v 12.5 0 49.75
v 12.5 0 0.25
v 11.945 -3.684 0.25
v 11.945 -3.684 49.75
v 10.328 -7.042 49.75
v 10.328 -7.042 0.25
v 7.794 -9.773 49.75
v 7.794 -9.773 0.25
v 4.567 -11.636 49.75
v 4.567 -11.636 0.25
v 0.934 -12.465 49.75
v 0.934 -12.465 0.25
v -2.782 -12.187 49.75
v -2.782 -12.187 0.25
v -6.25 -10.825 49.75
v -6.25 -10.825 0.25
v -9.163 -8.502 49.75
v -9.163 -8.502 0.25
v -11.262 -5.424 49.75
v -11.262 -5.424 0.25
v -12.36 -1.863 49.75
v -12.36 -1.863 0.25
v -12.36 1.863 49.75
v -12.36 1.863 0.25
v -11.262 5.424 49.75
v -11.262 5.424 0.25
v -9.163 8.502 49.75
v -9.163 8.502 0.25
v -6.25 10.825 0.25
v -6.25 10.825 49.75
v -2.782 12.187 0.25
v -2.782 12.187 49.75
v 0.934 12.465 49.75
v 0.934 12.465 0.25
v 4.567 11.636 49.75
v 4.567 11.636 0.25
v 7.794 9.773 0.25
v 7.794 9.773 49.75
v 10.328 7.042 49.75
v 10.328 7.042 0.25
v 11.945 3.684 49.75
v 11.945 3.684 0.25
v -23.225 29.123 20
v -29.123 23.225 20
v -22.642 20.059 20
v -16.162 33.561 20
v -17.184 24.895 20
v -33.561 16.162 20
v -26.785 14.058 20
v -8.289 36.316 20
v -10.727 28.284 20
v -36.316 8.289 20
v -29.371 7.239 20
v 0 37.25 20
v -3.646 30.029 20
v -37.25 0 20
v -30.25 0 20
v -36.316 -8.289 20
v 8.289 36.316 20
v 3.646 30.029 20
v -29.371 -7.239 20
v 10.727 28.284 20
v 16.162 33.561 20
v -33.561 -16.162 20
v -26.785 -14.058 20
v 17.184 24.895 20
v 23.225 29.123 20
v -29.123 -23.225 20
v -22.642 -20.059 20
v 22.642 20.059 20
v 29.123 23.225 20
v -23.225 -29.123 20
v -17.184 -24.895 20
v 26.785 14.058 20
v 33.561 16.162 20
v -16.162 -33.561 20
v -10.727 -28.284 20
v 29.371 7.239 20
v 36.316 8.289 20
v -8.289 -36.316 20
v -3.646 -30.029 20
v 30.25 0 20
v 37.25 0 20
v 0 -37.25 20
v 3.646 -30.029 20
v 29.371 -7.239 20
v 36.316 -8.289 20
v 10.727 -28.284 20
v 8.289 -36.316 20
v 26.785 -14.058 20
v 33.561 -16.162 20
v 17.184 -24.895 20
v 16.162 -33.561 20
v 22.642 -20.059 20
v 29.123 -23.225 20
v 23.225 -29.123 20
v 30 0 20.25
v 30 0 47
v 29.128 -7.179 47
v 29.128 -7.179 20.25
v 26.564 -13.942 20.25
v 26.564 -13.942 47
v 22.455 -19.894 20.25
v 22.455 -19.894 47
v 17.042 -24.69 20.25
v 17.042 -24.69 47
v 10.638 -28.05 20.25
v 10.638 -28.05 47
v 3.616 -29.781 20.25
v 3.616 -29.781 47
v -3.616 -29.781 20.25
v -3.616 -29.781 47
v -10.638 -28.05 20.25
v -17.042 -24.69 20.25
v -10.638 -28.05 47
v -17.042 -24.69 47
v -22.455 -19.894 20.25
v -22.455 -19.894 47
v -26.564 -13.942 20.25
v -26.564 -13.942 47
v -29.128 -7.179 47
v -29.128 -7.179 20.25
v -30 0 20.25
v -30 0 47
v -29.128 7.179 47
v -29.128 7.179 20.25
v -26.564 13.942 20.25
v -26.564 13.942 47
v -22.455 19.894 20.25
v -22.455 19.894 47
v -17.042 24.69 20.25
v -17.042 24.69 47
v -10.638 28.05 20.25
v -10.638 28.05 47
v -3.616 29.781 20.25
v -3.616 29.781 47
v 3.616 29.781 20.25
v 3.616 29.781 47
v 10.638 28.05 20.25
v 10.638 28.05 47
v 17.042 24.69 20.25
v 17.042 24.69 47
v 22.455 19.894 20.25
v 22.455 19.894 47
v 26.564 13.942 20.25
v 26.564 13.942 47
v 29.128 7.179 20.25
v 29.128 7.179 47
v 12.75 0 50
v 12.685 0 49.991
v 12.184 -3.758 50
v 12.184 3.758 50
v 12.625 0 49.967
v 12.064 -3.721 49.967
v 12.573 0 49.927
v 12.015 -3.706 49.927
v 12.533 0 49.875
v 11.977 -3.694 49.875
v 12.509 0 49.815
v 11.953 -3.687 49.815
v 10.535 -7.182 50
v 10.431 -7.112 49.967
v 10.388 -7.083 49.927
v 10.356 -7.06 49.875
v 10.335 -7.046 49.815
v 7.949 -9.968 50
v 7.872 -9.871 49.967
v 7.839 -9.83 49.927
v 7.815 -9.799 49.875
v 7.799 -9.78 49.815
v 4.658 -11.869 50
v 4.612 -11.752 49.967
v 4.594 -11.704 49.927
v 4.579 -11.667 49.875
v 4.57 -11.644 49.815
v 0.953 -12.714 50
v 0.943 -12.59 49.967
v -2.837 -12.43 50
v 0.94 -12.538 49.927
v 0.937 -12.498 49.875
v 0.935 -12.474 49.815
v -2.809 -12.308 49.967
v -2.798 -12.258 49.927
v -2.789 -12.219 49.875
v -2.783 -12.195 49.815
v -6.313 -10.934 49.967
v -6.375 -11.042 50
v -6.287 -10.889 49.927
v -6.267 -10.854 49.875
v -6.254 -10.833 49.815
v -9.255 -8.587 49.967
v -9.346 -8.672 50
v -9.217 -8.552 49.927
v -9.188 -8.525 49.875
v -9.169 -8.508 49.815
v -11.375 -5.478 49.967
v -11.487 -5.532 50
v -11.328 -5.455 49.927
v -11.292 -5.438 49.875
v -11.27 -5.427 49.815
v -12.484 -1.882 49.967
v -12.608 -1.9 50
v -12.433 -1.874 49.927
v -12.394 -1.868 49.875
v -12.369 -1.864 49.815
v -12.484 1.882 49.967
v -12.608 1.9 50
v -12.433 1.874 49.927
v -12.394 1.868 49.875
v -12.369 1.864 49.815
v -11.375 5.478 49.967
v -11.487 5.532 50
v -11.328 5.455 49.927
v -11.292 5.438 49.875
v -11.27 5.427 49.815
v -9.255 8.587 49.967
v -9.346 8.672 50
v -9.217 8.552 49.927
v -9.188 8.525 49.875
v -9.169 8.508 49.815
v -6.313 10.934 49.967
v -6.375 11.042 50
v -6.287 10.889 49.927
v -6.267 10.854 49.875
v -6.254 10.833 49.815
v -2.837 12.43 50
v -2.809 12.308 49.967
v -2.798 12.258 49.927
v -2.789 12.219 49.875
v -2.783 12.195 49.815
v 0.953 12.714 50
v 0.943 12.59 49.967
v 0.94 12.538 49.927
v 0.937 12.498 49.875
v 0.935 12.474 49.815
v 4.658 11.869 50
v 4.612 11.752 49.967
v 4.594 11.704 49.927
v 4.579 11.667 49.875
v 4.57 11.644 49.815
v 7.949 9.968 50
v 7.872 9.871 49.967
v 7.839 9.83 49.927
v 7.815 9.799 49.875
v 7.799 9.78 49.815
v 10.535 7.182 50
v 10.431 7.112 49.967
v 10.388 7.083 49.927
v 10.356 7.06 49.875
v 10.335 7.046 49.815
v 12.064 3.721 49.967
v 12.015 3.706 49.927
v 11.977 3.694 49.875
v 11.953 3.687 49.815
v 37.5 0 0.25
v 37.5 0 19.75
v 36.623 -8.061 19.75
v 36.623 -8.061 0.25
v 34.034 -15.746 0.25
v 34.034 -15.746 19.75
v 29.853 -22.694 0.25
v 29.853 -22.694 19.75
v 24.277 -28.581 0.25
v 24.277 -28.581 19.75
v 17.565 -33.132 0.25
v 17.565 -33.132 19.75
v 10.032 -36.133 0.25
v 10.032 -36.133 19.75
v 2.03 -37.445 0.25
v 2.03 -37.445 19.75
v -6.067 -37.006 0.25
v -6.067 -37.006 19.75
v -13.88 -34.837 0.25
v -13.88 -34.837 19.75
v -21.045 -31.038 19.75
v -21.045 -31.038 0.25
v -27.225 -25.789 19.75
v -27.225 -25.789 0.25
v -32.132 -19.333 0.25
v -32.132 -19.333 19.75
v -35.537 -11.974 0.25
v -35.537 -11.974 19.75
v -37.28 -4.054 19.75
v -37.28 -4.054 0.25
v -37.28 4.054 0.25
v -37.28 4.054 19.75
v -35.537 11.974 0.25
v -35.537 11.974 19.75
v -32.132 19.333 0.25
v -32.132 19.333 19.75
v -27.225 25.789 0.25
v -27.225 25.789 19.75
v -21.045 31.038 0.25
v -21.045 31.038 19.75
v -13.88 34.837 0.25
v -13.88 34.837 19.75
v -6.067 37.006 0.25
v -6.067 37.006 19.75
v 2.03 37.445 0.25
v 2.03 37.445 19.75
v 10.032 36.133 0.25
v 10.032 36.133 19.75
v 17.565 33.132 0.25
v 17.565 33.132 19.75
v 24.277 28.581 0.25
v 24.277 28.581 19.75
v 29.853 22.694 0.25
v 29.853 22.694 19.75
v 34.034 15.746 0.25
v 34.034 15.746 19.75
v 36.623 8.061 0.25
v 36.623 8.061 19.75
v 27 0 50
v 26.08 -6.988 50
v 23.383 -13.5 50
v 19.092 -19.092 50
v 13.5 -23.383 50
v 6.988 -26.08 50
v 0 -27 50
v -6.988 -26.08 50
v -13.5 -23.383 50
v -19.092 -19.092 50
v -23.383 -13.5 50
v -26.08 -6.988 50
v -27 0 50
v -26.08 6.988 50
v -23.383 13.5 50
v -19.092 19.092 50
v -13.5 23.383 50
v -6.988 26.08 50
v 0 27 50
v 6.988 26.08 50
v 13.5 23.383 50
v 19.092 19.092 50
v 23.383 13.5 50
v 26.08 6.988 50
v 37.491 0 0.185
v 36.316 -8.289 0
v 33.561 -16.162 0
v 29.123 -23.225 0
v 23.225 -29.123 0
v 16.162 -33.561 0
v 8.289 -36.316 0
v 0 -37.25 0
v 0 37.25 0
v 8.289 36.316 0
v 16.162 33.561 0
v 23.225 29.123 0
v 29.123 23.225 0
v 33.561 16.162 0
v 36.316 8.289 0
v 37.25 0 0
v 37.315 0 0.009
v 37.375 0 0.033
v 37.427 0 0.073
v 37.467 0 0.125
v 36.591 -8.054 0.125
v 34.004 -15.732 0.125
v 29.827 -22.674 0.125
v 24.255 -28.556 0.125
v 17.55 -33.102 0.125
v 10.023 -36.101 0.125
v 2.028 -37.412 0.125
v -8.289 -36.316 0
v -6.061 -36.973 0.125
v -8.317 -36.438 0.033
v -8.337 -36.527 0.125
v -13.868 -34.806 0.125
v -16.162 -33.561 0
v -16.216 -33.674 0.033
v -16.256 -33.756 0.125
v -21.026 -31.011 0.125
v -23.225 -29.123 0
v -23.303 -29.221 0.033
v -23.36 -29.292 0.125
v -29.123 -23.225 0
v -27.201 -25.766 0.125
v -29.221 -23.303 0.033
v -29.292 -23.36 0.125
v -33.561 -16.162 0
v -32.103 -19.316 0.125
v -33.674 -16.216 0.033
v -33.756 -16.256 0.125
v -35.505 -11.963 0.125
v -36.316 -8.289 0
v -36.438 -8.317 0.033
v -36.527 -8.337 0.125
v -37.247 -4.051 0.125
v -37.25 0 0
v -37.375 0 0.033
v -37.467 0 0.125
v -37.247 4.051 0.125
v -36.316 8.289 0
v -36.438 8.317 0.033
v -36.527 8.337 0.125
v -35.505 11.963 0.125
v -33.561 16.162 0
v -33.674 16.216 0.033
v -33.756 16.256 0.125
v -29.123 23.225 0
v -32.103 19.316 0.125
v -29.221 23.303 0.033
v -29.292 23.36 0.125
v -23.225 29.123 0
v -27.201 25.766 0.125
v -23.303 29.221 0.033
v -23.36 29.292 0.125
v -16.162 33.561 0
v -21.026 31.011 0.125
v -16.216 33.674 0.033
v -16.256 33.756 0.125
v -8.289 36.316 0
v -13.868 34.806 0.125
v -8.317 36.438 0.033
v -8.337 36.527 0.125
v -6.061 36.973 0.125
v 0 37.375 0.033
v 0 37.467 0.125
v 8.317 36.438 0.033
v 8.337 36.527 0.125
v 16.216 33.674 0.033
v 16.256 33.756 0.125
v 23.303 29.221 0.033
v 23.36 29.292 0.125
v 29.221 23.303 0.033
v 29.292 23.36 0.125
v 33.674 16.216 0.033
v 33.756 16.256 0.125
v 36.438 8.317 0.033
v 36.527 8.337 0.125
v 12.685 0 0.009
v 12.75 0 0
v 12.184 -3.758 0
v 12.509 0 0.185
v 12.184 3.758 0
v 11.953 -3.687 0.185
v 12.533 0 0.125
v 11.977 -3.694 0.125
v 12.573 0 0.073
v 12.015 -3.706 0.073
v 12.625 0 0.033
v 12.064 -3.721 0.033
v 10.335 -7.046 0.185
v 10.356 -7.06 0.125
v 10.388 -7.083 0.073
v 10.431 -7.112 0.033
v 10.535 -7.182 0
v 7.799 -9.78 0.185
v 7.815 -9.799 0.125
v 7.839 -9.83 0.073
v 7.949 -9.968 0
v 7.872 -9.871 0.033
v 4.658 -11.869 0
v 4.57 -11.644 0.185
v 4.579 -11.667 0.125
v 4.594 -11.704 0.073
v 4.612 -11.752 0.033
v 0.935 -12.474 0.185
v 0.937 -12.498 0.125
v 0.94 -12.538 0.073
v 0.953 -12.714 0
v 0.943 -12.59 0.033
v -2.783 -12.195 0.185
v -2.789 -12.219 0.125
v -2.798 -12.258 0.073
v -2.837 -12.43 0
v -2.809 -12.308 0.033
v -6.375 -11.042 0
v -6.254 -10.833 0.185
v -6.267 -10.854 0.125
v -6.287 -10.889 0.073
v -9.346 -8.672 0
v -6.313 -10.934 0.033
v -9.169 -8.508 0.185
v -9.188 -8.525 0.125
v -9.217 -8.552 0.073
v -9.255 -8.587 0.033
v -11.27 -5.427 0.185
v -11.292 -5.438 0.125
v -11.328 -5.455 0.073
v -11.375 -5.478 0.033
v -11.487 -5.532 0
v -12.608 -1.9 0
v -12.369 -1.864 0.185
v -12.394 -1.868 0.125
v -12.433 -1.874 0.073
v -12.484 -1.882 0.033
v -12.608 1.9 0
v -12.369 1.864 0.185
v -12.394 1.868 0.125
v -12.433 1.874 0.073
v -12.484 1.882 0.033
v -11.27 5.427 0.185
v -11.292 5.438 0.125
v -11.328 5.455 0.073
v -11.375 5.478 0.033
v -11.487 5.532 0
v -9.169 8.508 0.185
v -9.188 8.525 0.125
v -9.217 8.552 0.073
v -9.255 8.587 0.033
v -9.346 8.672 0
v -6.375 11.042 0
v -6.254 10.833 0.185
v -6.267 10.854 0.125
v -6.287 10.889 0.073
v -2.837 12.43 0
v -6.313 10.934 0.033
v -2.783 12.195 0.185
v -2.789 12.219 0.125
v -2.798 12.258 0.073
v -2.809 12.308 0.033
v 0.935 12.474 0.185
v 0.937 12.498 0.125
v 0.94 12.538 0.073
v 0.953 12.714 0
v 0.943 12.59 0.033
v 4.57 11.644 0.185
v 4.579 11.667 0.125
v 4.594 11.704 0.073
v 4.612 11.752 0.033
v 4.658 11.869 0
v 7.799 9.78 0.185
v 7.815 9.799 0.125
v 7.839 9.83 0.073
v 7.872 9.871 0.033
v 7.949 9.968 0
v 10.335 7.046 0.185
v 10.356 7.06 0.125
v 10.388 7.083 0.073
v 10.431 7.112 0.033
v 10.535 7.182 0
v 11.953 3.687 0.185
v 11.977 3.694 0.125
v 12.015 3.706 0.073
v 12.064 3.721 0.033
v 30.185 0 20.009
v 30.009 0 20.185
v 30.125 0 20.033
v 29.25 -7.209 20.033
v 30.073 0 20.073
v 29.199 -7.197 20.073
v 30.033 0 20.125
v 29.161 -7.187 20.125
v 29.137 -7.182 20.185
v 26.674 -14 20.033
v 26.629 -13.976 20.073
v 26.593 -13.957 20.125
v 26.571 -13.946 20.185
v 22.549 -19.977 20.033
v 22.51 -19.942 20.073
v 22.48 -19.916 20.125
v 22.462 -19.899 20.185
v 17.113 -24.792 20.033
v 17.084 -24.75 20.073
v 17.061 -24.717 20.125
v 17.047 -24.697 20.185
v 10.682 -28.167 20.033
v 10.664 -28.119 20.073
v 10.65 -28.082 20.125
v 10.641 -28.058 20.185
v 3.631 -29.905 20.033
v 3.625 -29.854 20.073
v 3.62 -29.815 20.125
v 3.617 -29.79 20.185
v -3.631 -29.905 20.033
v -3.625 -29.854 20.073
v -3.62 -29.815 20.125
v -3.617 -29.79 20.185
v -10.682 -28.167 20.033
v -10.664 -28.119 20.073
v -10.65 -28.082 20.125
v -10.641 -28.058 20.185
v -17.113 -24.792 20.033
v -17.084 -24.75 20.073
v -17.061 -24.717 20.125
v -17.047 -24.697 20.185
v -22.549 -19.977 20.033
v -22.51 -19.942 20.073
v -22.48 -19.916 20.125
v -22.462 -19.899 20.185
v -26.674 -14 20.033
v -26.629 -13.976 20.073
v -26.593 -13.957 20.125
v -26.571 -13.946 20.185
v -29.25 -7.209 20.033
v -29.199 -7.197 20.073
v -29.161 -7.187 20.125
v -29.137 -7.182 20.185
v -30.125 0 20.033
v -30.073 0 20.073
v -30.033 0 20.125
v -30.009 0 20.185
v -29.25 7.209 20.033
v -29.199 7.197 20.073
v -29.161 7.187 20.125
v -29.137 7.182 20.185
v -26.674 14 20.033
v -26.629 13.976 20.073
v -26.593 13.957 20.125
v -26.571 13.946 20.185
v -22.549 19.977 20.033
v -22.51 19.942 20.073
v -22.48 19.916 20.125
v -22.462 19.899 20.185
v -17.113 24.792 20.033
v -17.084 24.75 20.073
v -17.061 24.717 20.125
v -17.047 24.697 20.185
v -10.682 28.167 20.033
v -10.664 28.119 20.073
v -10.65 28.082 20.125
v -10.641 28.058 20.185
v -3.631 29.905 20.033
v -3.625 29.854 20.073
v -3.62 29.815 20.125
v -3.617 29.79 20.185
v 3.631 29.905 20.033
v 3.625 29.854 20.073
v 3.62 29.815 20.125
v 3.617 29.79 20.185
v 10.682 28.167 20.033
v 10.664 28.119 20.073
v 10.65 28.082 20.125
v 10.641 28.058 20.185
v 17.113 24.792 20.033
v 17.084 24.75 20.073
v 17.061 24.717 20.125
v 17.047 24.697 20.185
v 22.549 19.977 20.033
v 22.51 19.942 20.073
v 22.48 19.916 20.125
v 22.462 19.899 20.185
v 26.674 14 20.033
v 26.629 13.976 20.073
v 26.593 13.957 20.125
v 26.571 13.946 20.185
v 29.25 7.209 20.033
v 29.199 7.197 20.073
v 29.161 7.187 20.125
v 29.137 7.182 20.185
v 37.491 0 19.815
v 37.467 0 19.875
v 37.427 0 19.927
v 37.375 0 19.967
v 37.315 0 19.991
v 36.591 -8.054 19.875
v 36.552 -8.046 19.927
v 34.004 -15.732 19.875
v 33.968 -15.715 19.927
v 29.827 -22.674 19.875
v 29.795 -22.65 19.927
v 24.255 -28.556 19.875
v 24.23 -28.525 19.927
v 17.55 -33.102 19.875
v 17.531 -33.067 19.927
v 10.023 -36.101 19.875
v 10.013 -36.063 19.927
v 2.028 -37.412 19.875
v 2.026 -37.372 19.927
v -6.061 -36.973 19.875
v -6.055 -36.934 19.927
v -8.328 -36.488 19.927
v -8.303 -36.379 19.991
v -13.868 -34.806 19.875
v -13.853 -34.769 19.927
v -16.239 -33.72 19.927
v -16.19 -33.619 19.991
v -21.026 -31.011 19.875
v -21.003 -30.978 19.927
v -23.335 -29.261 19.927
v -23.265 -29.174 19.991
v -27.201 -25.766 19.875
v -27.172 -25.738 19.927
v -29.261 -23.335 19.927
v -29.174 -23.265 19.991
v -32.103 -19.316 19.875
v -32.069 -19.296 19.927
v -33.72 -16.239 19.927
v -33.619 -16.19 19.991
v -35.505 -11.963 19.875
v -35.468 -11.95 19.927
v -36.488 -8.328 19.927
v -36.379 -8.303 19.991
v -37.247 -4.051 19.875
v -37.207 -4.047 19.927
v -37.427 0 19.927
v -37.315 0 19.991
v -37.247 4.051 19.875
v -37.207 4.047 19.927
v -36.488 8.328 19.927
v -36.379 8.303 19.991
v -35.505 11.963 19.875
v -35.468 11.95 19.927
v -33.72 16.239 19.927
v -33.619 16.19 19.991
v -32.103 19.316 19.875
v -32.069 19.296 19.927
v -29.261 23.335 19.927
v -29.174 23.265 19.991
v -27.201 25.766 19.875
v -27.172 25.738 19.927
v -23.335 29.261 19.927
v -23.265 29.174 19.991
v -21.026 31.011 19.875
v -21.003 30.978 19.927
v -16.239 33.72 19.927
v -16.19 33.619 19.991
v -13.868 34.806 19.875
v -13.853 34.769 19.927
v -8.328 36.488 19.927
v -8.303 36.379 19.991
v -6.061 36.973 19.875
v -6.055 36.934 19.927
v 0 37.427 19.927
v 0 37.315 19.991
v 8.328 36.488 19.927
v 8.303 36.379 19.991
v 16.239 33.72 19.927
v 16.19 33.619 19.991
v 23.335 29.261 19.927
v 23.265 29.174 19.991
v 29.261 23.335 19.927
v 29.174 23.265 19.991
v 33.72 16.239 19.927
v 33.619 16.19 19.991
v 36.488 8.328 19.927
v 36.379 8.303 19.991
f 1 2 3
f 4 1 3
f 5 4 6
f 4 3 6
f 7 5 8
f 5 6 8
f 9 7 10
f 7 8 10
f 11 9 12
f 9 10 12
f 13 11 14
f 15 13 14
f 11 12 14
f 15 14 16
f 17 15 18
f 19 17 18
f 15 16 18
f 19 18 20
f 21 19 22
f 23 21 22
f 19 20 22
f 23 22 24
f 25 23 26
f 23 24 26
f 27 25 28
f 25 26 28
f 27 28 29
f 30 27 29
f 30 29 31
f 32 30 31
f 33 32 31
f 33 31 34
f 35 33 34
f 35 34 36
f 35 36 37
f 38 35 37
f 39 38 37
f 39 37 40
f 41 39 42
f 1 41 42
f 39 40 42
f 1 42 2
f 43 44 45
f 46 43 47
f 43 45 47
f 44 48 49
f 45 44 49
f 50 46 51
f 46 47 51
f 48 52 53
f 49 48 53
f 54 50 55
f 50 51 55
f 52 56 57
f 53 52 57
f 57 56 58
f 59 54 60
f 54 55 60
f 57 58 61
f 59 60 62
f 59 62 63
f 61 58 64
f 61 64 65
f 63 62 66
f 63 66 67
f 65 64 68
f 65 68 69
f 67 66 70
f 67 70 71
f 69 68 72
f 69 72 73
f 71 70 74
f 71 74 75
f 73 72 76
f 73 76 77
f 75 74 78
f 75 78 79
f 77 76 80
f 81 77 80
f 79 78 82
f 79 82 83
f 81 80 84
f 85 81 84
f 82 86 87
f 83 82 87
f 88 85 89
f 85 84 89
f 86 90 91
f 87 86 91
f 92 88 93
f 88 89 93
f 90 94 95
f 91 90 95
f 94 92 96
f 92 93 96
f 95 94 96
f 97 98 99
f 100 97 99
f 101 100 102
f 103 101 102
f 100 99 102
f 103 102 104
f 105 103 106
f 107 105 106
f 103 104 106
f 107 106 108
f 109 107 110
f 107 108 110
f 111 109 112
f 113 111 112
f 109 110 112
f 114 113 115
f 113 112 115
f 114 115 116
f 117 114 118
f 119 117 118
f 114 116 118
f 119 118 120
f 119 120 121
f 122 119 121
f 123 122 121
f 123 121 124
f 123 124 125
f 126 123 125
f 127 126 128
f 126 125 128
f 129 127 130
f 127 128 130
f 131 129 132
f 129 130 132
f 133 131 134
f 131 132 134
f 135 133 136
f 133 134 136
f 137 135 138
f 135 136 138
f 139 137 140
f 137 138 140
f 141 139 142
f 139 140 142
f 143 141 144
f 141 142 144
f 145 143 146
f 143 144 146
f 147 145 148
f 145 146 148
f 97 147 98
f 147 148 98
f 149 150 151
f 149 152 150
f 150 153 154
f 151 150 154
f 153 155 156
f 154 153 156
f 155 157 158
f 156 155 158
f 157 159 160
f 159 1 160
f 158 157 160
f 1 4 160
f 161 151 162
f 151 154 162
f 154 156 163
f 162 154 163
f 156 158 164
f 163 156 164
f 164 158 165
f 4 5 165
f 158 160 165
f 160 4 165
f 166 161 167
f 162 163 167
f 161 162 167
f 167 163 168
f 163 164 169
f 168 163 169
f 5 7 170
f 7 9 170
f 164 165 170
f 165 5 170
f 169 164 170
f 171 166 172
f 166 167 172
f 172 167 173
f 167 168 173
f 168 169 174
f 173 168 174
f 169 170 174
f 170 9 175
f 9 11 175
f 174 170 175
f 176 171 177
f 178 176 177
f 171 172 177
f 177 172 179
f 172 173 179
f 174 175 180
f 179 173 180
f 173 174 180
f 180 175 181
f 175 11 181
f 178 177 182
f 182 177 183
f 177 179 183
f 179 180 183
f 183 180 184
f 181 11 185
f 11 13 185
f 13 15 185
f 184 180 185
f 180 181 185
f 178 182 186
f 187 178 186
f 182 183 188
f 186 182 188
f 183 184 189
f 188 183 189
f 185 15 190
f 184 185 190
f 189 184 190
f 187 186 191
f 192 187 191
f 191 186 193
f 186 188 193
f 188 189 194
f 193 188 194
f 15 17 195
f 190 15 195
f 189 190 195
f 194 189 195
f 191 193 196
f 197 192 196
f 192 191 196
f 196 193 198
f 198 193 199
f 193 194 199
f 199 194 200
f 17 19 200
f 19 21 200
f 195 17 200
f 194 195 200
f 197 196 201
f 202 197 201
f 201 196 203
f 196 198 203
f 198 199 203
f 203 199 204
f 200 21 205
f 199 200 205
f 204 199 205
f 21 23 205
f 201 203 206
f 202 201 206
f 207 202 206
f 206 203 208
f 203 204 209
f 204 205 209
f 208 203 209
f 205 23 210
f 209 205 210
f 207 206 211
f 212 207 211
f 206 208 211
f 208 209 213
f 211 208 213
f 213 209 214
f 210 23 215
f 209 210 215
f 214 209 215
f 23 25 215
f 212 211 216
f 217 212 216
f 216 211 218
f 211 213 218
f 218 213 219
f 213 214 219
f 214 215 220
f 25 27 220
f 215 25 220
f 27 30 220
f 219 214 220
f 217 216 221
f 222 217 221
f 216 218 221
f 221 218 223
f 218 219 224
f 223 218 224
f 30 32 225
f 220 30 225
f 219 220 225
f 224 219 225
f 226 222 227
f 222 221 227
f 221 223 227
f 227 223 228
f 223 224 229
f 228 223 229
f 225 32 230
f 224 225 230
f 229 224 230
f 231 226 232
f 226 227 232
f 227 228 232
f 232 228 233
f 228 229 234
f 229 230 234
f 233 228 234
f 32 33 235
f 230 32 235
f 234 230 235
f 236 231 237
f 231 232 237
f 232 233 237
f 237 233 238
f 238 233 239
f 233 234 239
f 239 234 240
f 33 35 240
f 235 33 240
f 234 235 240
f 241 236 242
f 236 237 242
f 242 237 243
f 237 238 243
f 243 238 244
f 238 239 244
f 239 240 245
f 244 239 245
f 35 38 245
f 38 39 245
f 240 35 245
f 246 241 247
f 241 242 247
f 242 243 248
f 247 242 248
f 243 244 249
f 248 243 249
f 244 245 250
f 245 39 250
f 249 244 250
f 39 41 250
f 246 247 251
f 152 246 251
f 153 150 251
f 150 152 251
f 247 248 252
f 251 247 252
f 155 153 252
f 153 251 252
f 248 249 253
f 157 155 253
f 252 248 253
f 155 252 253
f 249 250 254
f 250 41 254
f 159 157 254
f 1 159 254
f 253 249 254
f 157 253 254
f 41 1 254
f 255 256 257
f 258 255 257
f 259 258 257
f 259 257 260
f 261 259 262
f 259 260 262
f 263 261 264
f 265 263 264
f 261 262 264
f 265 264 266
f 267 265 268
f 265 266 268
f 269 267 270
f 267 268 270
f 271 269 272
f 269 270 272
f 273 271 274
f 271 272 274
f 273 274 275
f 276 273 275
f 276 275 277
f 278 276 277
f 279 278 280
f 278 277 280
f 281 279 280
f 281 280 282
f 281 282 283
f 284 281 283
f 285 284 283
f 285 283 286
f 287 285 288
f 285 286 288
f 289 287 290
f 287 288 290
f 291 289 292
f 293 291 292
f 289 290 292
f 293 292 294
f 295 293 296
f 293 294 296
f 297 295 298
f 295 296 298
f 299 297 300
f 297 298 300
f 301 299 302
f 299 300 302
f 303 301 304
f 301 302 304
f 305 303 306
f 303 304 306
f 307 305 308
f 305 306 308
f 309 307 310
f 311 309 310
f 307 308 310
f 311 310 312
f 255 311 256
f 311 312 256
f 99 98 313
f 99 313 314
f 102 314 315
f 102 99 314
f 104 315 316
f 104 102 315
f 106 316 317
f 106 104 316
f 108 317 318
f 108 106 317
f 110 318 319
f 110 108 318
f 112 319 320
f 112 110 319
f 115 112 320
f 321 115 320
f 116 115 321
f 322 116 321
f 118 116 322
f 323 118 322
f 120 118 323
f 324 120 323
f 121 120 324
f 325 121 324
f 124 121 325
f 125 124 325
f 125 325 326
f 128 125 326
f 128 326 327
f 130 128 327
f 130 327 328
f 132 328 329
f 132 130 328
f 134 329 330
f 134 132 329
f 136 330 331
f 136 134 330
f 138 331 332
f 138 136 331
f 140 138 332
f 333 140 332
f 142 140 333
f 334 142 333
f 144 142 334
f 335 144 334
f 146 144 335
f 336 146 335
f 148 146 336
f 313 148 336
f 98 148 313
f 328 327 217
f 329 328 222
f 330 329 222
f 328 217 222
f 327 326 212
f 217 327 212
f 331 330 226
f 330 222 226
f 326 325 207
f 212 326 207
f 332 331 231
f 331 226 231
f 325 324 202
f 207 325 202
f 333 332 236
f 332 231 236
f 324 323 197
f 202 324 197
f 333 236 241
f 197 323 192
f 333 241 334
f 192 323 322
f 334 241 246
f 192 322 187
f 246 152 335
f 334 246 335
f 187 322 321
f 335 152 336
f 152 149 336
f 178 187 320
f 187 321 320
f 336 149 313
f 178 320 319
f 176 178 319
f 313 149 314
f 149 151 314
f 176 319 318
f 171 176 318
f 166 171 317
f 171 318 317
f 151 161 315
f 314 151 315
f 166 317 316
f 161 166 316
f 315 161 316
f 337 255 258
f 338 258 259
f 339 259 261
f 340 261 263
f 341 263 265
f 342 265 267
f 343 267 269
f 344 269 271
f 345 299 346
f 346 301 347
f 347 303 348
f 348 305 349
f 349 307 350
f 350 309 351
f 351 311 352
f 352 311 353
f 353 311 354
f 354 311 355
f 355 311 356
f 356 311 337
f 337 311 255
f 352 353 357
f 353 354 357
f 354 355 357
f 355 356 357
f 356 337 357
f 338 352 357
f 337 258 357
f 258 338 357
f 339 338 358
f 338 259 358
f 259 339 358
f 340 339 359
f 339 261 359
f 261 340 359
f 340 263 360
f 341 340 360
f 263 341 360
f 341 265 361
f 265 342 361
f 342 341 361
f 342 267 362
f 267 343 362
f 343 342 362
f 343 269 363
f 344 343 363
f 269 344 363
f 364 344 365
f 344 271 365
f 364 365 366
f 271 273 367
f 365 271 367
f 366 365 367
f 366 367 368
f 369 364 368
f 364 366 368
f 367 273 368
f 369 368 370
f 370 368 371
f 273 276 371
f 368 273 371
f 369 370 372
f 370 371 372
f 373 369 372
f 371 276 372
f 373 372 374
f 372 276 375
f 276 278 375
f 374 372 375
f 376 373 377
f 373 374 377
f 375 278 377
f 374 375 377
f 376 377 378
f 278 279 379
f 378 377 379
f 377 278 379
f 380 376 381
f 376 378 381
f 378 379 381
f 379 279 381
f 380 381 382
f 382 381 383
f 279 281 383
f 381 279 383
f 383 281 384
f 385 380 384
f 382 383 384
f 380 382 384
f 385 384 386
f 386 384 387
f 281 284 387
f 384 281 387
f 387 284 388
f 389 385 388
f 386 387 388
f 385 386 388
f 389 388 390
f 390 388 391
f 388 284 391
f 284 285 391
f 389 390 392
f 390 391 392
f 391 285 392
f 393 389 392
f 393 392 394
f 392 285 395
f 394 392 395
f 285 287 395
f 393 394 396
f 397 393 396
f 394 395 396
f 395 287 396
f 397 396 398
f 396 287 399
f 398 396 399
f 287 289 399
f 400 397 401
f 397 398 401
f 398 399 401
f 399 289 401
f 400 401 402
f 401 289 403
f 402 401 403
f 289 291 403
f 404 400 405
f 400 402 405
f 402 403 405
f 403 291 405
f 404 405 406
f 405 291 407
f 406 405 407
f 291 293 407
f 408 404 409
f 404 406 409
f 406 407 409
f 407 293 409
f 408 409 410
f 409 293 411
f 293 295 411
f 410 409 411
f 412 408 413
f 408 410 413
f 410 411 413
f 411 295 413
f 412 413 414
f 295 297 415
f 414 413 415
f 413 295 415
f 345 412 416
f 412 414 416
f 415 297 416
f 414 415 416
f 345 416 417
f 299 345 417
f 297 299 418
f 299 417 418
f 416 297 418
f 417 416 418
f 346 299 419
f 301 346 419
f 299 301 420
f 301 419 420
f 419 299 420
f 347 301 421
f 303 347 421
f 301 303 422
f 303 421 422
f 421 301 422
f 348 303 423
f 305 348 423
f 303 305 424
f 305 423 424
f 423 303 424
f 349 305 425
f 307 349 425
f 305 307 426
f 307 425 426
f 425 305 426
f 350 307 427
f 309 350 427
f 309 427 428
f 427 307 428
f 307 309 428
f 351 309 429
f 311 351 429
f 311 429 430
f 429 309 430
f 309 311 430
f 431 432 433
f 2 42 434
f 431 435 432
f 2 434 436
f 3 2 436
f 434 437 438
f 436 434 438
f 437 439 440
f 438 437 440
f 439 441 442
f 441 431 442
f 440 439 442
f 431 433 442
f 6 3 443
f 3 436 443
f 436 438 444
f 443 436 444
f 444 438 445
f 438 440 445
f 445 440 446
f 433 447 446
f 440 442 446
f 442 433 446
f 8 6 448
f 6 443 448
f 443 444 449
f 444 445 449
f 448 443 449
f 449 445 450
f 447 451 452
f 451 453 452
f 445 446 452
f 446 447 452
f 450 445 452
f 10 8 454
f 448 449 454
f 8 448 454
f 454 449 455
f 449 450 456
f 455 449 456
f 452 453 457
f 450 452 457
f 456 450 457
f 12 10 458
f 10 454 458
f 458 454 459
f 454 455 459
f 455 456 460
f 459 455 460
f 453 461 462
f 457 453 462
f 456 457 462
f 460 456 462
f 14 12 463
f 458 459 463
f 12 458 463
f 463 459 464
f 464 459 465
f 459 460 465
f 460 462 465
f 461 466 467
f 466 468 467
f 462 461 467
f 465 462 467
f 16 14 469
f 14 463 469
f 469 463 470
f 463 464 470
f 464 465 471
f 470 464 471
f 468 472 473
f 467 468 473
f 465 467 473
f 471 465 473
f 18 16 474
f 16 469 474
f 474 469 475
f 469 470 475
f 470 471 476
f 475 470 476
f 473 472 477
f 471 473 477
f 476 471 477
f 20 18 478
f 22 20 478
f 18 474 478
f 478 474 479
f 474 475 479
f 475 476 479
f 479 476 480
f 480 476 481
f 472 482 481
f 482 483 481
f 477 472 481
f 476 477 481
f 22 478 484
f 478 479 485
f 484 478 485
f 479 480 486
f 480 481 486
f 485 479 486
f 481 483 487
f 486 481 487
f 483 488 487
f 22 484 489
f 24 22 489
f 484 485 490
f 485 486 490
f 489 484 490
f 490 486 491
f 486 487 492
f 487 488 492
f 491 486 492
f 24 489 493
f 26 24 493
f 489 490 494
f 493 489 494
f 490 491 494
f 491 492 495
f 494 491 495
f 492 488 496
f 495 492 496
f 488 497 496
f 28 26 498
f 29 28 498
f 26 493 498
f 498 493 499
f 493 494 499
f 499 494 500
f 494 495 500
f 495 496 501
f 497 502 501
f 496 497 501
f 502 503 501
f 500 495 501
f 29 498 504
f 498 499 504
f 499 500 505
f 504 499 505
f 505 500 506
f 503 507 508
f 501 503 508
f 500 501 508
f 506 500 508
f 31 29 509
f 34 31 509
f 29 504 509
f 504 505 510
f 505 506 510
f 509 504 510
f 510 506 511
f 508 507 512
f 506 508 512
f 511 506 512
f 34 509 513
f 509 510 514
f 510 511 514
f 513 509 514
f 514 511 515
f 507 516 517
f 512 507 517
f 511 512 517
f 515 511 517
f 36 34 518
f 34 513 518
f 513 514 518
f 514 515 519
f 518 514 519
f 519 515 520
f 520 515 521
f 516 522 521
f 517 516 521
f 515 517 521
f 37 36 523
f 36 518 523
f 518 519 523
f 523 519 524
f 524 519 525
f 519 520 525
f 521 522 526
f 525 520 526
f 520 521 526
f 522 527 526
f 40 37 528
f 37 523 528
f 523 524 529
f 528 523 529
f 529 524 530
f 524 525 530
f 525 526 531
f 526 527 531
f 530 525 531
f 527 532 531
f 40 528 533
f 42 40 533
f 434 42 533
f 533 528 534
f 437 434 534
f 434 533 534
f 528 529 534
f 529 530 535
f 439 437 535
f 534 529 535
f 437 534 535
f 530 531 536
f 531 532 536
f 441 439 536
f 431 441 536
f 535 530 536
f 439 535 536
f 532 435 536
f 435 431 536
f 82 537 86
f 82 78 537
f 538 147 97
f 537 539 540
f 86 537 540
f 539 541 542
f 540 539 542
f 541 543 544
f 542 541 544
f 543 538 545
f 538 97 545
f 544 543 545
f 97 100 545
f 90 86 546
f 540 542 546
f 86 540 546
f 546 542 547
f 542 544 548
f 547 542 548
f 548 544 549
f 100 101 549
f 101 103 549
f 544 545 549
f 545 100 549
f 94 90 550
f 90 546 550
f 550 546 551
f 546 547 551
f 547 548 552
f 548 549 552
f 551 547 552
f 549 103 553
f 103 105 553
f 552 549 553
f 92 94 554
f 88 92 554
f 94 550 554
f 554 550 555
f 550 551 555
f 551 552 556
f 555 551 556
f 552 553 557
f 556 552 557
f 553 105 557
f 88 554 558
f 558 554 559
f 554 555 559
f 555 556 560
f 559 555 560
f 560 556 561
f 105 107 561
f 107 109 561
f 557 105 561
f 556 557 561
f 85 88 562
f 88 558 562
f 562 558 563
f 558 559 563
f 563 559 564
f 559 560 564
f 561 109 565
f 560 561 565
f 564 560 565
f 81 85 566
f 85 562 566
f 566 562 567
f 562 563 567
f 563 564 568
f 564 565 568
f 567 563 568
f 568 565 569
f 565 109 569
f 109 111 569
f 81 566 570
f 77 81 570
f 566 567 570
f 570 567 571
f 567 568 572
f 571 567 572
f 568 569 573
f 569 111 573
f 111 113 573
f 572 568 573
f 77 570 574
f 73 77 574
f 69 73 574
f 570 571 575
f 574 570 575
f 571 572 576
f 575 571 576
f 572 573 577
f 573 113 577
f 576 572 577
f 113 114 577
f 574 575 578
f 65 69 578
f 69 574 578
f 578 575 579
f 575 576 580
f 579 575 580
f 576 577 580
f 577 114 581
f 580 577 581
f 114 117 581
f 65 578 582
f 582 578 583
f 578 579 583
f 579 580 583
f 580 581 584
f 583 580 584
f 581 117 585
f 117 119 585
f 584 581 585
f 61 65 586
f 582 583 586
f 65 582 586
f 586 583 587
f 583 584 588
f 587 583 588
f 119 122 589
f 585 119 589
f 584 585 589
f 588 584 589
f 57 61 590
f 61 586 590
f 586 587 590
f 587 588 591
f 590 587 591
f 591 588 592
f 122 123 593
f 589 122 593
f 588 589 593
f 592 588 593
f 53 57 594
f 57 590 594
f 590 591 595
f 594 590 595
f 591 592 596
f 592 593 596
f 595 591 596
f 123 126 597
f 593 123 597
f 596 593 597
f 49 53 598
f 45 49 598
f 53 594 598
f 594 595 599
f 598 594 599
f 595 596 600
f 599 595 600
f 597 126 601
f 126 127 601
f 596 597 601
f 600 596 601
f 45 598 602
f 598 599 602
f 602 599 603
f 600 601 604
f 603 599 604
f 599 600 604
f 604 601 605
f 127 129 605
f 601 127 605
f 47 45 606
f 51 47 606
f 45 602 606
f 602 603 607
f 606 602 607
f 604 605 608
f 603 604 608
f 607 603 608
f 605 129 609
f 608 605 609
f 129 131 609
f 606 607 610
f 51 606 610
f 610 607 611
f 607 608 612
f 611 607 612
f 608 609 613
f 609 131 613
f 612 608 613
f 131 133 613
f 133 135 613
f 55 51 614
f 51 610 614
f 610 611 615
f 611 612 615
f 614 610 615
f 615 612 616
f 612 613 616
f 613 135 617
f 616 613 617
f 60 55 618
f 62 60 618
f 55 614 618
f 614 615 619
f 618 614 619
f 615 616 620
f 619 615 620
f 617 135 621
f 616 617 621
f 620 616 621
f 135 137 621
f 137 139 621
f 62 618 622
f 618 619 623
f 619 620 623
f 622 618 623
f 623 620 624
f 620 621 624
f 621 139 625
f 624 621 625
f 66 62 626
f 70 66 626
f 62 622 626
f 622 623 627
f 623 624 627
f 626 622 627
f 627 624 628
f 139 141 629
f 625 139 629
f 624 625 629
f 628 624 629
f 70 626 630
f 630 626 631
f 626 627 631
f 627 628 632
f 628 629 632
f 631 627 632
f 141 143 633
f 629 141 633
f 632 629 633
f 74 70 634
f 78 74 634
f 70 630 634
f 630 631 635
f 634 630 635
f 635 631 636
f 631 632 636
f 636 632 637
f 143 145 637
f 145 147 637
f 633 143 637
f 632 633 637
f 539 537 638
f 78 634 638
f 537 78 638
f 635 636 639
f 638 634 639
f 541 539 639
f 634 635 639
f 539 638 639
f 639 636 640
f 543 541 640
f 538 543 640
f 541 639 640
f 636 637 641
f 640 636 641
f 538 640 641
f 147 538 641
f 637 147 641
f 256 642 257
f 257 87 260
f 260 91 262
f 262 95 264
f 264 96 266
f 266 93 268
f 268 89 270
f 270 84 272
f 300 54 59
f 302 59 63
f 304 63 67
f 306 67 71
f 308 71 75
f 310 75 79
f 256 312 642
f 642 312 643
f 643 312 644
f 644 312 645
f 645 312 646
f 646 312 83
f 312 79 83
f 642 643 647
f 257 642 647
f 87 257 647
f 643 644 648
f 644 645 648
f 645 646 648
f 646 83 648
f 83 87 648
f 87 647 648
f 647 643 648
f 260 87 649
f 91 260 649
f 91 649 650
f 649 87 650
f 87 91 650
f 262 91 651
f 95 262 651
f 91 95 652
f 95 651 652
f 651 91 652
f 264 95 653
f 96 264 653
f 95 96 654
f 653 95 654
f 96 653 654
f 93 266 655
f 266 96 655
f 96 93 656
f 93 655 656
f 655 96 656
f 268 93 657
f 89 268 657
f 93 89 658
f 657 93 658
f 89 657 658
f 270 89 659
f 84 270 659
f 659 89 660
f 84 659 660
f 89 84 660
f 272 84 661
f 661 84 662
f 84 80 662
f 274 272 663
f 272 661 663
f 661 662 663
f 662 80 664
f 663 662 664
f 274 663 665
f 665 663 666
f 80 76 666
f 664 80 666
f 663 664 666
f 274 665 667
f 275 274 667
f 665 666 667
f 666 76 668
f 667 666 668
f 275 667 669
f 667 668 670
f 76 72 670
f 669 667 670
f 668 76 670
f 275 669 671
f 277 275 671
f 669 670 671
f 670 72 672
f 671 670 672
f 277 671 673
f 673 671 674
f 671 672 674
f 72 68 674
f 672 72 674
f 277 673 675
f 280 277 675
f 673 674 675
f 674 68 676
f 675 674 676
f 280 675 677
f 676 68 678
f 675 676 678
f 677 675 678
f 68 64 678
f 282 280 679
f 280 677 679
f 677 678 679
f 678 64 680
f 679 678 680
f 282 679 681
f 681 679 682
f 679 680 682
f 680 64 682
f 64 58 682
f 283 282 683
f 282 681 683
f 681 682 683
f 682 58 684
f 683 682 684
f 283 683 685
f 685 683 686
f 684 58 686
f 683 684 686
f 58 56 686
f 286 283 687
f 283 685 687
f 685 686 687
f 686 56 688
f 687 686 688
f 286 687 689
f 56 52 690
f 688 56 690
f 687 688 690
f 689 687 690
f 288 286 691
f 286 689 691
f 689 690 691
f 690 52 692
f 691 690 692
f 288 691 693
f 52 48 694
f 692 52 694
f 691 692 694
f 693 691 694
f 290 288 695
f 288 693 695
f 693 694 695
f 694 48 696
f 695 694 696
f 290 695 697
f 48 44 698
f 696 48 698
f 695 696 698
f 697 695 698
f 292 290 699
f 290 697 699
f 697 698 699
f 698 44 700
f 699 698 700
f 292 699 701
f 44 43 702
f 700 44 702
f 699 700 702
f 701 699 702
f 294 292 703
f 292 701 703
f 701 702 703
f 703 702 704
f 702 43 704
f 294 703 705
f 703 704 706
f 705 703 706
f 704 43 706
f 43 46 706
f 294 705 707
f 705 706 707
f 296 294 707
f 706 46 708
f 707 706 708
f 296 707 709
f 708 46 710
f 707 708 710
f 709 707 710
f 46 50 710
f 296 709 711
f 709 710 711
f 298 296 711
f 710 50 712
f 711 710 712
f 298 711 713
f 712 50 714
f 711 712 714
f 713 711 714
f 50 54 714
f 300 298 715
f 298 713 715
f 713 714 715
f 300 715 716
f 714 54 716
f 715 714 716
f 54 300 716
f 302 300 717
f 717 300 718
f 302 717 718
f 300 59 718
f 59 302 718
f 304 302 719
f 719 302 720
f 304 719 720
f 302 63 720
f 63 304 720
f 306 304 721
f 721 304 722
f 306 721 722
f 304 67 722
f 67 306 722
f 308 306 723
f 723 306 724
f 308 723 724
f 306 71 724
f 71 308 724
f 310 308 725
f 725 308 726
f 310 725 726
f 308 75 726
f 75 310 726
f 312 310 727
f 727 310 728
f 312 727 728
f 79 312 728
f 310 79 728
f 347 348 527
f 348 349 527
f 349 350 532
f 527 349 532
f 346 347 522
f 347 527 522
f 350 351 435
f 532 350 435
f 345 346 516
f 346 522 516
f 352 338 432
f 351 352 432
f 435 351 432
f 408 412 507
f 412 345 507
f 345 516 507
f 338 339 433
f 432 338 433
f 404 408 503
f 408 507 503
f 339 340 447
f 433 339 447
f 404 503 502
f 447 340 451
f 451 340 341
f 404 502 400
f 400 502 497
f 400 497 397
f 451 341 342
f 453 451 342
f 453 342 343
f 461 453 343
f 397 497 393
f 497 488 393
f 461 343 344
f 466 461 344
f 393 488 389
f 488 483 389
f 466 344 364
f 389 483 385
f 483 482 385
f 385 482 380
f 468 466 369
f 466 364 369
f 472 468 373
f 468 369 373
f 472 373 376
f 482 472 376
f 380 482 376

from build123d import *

# Parameters (mm, degrees)
F2_R    = 0.25
F3_SIZE = 3


with BuildPart() as f1:
    # F0 (on Front) → F1 (revolve)
    with BuildSketch(Plane.XZ):
        Polygon((30, 50), (12.5, 50), (12.5, 0), (37.5, 0), (37.5, 20), (30, 20), align=None)
    revolve(axis=Axis((0, 0, 16.379672), (0, 0, -1)))

    # F2
    f2_edges = [f1.edges().sort_by_distance(p)[0] for p in [
        (-12.5, 0, 50),
        (-12.5, 0, 0),
        (12.5, 0, 25),
        (-37.5, 0, 20),
        (-30, 0, 20),
        (-37.5, 0, 0),
    ]]
    fillet(f2_edges, radius=F2_R)

    # F3
    f3_edges = [f1.edges().sort_by_distance(p)[0] for p in [
        (-30, 0, 50),
    ]]
    chamfer(f3_edges, length=F3_SIZE)


solid = f1.part
